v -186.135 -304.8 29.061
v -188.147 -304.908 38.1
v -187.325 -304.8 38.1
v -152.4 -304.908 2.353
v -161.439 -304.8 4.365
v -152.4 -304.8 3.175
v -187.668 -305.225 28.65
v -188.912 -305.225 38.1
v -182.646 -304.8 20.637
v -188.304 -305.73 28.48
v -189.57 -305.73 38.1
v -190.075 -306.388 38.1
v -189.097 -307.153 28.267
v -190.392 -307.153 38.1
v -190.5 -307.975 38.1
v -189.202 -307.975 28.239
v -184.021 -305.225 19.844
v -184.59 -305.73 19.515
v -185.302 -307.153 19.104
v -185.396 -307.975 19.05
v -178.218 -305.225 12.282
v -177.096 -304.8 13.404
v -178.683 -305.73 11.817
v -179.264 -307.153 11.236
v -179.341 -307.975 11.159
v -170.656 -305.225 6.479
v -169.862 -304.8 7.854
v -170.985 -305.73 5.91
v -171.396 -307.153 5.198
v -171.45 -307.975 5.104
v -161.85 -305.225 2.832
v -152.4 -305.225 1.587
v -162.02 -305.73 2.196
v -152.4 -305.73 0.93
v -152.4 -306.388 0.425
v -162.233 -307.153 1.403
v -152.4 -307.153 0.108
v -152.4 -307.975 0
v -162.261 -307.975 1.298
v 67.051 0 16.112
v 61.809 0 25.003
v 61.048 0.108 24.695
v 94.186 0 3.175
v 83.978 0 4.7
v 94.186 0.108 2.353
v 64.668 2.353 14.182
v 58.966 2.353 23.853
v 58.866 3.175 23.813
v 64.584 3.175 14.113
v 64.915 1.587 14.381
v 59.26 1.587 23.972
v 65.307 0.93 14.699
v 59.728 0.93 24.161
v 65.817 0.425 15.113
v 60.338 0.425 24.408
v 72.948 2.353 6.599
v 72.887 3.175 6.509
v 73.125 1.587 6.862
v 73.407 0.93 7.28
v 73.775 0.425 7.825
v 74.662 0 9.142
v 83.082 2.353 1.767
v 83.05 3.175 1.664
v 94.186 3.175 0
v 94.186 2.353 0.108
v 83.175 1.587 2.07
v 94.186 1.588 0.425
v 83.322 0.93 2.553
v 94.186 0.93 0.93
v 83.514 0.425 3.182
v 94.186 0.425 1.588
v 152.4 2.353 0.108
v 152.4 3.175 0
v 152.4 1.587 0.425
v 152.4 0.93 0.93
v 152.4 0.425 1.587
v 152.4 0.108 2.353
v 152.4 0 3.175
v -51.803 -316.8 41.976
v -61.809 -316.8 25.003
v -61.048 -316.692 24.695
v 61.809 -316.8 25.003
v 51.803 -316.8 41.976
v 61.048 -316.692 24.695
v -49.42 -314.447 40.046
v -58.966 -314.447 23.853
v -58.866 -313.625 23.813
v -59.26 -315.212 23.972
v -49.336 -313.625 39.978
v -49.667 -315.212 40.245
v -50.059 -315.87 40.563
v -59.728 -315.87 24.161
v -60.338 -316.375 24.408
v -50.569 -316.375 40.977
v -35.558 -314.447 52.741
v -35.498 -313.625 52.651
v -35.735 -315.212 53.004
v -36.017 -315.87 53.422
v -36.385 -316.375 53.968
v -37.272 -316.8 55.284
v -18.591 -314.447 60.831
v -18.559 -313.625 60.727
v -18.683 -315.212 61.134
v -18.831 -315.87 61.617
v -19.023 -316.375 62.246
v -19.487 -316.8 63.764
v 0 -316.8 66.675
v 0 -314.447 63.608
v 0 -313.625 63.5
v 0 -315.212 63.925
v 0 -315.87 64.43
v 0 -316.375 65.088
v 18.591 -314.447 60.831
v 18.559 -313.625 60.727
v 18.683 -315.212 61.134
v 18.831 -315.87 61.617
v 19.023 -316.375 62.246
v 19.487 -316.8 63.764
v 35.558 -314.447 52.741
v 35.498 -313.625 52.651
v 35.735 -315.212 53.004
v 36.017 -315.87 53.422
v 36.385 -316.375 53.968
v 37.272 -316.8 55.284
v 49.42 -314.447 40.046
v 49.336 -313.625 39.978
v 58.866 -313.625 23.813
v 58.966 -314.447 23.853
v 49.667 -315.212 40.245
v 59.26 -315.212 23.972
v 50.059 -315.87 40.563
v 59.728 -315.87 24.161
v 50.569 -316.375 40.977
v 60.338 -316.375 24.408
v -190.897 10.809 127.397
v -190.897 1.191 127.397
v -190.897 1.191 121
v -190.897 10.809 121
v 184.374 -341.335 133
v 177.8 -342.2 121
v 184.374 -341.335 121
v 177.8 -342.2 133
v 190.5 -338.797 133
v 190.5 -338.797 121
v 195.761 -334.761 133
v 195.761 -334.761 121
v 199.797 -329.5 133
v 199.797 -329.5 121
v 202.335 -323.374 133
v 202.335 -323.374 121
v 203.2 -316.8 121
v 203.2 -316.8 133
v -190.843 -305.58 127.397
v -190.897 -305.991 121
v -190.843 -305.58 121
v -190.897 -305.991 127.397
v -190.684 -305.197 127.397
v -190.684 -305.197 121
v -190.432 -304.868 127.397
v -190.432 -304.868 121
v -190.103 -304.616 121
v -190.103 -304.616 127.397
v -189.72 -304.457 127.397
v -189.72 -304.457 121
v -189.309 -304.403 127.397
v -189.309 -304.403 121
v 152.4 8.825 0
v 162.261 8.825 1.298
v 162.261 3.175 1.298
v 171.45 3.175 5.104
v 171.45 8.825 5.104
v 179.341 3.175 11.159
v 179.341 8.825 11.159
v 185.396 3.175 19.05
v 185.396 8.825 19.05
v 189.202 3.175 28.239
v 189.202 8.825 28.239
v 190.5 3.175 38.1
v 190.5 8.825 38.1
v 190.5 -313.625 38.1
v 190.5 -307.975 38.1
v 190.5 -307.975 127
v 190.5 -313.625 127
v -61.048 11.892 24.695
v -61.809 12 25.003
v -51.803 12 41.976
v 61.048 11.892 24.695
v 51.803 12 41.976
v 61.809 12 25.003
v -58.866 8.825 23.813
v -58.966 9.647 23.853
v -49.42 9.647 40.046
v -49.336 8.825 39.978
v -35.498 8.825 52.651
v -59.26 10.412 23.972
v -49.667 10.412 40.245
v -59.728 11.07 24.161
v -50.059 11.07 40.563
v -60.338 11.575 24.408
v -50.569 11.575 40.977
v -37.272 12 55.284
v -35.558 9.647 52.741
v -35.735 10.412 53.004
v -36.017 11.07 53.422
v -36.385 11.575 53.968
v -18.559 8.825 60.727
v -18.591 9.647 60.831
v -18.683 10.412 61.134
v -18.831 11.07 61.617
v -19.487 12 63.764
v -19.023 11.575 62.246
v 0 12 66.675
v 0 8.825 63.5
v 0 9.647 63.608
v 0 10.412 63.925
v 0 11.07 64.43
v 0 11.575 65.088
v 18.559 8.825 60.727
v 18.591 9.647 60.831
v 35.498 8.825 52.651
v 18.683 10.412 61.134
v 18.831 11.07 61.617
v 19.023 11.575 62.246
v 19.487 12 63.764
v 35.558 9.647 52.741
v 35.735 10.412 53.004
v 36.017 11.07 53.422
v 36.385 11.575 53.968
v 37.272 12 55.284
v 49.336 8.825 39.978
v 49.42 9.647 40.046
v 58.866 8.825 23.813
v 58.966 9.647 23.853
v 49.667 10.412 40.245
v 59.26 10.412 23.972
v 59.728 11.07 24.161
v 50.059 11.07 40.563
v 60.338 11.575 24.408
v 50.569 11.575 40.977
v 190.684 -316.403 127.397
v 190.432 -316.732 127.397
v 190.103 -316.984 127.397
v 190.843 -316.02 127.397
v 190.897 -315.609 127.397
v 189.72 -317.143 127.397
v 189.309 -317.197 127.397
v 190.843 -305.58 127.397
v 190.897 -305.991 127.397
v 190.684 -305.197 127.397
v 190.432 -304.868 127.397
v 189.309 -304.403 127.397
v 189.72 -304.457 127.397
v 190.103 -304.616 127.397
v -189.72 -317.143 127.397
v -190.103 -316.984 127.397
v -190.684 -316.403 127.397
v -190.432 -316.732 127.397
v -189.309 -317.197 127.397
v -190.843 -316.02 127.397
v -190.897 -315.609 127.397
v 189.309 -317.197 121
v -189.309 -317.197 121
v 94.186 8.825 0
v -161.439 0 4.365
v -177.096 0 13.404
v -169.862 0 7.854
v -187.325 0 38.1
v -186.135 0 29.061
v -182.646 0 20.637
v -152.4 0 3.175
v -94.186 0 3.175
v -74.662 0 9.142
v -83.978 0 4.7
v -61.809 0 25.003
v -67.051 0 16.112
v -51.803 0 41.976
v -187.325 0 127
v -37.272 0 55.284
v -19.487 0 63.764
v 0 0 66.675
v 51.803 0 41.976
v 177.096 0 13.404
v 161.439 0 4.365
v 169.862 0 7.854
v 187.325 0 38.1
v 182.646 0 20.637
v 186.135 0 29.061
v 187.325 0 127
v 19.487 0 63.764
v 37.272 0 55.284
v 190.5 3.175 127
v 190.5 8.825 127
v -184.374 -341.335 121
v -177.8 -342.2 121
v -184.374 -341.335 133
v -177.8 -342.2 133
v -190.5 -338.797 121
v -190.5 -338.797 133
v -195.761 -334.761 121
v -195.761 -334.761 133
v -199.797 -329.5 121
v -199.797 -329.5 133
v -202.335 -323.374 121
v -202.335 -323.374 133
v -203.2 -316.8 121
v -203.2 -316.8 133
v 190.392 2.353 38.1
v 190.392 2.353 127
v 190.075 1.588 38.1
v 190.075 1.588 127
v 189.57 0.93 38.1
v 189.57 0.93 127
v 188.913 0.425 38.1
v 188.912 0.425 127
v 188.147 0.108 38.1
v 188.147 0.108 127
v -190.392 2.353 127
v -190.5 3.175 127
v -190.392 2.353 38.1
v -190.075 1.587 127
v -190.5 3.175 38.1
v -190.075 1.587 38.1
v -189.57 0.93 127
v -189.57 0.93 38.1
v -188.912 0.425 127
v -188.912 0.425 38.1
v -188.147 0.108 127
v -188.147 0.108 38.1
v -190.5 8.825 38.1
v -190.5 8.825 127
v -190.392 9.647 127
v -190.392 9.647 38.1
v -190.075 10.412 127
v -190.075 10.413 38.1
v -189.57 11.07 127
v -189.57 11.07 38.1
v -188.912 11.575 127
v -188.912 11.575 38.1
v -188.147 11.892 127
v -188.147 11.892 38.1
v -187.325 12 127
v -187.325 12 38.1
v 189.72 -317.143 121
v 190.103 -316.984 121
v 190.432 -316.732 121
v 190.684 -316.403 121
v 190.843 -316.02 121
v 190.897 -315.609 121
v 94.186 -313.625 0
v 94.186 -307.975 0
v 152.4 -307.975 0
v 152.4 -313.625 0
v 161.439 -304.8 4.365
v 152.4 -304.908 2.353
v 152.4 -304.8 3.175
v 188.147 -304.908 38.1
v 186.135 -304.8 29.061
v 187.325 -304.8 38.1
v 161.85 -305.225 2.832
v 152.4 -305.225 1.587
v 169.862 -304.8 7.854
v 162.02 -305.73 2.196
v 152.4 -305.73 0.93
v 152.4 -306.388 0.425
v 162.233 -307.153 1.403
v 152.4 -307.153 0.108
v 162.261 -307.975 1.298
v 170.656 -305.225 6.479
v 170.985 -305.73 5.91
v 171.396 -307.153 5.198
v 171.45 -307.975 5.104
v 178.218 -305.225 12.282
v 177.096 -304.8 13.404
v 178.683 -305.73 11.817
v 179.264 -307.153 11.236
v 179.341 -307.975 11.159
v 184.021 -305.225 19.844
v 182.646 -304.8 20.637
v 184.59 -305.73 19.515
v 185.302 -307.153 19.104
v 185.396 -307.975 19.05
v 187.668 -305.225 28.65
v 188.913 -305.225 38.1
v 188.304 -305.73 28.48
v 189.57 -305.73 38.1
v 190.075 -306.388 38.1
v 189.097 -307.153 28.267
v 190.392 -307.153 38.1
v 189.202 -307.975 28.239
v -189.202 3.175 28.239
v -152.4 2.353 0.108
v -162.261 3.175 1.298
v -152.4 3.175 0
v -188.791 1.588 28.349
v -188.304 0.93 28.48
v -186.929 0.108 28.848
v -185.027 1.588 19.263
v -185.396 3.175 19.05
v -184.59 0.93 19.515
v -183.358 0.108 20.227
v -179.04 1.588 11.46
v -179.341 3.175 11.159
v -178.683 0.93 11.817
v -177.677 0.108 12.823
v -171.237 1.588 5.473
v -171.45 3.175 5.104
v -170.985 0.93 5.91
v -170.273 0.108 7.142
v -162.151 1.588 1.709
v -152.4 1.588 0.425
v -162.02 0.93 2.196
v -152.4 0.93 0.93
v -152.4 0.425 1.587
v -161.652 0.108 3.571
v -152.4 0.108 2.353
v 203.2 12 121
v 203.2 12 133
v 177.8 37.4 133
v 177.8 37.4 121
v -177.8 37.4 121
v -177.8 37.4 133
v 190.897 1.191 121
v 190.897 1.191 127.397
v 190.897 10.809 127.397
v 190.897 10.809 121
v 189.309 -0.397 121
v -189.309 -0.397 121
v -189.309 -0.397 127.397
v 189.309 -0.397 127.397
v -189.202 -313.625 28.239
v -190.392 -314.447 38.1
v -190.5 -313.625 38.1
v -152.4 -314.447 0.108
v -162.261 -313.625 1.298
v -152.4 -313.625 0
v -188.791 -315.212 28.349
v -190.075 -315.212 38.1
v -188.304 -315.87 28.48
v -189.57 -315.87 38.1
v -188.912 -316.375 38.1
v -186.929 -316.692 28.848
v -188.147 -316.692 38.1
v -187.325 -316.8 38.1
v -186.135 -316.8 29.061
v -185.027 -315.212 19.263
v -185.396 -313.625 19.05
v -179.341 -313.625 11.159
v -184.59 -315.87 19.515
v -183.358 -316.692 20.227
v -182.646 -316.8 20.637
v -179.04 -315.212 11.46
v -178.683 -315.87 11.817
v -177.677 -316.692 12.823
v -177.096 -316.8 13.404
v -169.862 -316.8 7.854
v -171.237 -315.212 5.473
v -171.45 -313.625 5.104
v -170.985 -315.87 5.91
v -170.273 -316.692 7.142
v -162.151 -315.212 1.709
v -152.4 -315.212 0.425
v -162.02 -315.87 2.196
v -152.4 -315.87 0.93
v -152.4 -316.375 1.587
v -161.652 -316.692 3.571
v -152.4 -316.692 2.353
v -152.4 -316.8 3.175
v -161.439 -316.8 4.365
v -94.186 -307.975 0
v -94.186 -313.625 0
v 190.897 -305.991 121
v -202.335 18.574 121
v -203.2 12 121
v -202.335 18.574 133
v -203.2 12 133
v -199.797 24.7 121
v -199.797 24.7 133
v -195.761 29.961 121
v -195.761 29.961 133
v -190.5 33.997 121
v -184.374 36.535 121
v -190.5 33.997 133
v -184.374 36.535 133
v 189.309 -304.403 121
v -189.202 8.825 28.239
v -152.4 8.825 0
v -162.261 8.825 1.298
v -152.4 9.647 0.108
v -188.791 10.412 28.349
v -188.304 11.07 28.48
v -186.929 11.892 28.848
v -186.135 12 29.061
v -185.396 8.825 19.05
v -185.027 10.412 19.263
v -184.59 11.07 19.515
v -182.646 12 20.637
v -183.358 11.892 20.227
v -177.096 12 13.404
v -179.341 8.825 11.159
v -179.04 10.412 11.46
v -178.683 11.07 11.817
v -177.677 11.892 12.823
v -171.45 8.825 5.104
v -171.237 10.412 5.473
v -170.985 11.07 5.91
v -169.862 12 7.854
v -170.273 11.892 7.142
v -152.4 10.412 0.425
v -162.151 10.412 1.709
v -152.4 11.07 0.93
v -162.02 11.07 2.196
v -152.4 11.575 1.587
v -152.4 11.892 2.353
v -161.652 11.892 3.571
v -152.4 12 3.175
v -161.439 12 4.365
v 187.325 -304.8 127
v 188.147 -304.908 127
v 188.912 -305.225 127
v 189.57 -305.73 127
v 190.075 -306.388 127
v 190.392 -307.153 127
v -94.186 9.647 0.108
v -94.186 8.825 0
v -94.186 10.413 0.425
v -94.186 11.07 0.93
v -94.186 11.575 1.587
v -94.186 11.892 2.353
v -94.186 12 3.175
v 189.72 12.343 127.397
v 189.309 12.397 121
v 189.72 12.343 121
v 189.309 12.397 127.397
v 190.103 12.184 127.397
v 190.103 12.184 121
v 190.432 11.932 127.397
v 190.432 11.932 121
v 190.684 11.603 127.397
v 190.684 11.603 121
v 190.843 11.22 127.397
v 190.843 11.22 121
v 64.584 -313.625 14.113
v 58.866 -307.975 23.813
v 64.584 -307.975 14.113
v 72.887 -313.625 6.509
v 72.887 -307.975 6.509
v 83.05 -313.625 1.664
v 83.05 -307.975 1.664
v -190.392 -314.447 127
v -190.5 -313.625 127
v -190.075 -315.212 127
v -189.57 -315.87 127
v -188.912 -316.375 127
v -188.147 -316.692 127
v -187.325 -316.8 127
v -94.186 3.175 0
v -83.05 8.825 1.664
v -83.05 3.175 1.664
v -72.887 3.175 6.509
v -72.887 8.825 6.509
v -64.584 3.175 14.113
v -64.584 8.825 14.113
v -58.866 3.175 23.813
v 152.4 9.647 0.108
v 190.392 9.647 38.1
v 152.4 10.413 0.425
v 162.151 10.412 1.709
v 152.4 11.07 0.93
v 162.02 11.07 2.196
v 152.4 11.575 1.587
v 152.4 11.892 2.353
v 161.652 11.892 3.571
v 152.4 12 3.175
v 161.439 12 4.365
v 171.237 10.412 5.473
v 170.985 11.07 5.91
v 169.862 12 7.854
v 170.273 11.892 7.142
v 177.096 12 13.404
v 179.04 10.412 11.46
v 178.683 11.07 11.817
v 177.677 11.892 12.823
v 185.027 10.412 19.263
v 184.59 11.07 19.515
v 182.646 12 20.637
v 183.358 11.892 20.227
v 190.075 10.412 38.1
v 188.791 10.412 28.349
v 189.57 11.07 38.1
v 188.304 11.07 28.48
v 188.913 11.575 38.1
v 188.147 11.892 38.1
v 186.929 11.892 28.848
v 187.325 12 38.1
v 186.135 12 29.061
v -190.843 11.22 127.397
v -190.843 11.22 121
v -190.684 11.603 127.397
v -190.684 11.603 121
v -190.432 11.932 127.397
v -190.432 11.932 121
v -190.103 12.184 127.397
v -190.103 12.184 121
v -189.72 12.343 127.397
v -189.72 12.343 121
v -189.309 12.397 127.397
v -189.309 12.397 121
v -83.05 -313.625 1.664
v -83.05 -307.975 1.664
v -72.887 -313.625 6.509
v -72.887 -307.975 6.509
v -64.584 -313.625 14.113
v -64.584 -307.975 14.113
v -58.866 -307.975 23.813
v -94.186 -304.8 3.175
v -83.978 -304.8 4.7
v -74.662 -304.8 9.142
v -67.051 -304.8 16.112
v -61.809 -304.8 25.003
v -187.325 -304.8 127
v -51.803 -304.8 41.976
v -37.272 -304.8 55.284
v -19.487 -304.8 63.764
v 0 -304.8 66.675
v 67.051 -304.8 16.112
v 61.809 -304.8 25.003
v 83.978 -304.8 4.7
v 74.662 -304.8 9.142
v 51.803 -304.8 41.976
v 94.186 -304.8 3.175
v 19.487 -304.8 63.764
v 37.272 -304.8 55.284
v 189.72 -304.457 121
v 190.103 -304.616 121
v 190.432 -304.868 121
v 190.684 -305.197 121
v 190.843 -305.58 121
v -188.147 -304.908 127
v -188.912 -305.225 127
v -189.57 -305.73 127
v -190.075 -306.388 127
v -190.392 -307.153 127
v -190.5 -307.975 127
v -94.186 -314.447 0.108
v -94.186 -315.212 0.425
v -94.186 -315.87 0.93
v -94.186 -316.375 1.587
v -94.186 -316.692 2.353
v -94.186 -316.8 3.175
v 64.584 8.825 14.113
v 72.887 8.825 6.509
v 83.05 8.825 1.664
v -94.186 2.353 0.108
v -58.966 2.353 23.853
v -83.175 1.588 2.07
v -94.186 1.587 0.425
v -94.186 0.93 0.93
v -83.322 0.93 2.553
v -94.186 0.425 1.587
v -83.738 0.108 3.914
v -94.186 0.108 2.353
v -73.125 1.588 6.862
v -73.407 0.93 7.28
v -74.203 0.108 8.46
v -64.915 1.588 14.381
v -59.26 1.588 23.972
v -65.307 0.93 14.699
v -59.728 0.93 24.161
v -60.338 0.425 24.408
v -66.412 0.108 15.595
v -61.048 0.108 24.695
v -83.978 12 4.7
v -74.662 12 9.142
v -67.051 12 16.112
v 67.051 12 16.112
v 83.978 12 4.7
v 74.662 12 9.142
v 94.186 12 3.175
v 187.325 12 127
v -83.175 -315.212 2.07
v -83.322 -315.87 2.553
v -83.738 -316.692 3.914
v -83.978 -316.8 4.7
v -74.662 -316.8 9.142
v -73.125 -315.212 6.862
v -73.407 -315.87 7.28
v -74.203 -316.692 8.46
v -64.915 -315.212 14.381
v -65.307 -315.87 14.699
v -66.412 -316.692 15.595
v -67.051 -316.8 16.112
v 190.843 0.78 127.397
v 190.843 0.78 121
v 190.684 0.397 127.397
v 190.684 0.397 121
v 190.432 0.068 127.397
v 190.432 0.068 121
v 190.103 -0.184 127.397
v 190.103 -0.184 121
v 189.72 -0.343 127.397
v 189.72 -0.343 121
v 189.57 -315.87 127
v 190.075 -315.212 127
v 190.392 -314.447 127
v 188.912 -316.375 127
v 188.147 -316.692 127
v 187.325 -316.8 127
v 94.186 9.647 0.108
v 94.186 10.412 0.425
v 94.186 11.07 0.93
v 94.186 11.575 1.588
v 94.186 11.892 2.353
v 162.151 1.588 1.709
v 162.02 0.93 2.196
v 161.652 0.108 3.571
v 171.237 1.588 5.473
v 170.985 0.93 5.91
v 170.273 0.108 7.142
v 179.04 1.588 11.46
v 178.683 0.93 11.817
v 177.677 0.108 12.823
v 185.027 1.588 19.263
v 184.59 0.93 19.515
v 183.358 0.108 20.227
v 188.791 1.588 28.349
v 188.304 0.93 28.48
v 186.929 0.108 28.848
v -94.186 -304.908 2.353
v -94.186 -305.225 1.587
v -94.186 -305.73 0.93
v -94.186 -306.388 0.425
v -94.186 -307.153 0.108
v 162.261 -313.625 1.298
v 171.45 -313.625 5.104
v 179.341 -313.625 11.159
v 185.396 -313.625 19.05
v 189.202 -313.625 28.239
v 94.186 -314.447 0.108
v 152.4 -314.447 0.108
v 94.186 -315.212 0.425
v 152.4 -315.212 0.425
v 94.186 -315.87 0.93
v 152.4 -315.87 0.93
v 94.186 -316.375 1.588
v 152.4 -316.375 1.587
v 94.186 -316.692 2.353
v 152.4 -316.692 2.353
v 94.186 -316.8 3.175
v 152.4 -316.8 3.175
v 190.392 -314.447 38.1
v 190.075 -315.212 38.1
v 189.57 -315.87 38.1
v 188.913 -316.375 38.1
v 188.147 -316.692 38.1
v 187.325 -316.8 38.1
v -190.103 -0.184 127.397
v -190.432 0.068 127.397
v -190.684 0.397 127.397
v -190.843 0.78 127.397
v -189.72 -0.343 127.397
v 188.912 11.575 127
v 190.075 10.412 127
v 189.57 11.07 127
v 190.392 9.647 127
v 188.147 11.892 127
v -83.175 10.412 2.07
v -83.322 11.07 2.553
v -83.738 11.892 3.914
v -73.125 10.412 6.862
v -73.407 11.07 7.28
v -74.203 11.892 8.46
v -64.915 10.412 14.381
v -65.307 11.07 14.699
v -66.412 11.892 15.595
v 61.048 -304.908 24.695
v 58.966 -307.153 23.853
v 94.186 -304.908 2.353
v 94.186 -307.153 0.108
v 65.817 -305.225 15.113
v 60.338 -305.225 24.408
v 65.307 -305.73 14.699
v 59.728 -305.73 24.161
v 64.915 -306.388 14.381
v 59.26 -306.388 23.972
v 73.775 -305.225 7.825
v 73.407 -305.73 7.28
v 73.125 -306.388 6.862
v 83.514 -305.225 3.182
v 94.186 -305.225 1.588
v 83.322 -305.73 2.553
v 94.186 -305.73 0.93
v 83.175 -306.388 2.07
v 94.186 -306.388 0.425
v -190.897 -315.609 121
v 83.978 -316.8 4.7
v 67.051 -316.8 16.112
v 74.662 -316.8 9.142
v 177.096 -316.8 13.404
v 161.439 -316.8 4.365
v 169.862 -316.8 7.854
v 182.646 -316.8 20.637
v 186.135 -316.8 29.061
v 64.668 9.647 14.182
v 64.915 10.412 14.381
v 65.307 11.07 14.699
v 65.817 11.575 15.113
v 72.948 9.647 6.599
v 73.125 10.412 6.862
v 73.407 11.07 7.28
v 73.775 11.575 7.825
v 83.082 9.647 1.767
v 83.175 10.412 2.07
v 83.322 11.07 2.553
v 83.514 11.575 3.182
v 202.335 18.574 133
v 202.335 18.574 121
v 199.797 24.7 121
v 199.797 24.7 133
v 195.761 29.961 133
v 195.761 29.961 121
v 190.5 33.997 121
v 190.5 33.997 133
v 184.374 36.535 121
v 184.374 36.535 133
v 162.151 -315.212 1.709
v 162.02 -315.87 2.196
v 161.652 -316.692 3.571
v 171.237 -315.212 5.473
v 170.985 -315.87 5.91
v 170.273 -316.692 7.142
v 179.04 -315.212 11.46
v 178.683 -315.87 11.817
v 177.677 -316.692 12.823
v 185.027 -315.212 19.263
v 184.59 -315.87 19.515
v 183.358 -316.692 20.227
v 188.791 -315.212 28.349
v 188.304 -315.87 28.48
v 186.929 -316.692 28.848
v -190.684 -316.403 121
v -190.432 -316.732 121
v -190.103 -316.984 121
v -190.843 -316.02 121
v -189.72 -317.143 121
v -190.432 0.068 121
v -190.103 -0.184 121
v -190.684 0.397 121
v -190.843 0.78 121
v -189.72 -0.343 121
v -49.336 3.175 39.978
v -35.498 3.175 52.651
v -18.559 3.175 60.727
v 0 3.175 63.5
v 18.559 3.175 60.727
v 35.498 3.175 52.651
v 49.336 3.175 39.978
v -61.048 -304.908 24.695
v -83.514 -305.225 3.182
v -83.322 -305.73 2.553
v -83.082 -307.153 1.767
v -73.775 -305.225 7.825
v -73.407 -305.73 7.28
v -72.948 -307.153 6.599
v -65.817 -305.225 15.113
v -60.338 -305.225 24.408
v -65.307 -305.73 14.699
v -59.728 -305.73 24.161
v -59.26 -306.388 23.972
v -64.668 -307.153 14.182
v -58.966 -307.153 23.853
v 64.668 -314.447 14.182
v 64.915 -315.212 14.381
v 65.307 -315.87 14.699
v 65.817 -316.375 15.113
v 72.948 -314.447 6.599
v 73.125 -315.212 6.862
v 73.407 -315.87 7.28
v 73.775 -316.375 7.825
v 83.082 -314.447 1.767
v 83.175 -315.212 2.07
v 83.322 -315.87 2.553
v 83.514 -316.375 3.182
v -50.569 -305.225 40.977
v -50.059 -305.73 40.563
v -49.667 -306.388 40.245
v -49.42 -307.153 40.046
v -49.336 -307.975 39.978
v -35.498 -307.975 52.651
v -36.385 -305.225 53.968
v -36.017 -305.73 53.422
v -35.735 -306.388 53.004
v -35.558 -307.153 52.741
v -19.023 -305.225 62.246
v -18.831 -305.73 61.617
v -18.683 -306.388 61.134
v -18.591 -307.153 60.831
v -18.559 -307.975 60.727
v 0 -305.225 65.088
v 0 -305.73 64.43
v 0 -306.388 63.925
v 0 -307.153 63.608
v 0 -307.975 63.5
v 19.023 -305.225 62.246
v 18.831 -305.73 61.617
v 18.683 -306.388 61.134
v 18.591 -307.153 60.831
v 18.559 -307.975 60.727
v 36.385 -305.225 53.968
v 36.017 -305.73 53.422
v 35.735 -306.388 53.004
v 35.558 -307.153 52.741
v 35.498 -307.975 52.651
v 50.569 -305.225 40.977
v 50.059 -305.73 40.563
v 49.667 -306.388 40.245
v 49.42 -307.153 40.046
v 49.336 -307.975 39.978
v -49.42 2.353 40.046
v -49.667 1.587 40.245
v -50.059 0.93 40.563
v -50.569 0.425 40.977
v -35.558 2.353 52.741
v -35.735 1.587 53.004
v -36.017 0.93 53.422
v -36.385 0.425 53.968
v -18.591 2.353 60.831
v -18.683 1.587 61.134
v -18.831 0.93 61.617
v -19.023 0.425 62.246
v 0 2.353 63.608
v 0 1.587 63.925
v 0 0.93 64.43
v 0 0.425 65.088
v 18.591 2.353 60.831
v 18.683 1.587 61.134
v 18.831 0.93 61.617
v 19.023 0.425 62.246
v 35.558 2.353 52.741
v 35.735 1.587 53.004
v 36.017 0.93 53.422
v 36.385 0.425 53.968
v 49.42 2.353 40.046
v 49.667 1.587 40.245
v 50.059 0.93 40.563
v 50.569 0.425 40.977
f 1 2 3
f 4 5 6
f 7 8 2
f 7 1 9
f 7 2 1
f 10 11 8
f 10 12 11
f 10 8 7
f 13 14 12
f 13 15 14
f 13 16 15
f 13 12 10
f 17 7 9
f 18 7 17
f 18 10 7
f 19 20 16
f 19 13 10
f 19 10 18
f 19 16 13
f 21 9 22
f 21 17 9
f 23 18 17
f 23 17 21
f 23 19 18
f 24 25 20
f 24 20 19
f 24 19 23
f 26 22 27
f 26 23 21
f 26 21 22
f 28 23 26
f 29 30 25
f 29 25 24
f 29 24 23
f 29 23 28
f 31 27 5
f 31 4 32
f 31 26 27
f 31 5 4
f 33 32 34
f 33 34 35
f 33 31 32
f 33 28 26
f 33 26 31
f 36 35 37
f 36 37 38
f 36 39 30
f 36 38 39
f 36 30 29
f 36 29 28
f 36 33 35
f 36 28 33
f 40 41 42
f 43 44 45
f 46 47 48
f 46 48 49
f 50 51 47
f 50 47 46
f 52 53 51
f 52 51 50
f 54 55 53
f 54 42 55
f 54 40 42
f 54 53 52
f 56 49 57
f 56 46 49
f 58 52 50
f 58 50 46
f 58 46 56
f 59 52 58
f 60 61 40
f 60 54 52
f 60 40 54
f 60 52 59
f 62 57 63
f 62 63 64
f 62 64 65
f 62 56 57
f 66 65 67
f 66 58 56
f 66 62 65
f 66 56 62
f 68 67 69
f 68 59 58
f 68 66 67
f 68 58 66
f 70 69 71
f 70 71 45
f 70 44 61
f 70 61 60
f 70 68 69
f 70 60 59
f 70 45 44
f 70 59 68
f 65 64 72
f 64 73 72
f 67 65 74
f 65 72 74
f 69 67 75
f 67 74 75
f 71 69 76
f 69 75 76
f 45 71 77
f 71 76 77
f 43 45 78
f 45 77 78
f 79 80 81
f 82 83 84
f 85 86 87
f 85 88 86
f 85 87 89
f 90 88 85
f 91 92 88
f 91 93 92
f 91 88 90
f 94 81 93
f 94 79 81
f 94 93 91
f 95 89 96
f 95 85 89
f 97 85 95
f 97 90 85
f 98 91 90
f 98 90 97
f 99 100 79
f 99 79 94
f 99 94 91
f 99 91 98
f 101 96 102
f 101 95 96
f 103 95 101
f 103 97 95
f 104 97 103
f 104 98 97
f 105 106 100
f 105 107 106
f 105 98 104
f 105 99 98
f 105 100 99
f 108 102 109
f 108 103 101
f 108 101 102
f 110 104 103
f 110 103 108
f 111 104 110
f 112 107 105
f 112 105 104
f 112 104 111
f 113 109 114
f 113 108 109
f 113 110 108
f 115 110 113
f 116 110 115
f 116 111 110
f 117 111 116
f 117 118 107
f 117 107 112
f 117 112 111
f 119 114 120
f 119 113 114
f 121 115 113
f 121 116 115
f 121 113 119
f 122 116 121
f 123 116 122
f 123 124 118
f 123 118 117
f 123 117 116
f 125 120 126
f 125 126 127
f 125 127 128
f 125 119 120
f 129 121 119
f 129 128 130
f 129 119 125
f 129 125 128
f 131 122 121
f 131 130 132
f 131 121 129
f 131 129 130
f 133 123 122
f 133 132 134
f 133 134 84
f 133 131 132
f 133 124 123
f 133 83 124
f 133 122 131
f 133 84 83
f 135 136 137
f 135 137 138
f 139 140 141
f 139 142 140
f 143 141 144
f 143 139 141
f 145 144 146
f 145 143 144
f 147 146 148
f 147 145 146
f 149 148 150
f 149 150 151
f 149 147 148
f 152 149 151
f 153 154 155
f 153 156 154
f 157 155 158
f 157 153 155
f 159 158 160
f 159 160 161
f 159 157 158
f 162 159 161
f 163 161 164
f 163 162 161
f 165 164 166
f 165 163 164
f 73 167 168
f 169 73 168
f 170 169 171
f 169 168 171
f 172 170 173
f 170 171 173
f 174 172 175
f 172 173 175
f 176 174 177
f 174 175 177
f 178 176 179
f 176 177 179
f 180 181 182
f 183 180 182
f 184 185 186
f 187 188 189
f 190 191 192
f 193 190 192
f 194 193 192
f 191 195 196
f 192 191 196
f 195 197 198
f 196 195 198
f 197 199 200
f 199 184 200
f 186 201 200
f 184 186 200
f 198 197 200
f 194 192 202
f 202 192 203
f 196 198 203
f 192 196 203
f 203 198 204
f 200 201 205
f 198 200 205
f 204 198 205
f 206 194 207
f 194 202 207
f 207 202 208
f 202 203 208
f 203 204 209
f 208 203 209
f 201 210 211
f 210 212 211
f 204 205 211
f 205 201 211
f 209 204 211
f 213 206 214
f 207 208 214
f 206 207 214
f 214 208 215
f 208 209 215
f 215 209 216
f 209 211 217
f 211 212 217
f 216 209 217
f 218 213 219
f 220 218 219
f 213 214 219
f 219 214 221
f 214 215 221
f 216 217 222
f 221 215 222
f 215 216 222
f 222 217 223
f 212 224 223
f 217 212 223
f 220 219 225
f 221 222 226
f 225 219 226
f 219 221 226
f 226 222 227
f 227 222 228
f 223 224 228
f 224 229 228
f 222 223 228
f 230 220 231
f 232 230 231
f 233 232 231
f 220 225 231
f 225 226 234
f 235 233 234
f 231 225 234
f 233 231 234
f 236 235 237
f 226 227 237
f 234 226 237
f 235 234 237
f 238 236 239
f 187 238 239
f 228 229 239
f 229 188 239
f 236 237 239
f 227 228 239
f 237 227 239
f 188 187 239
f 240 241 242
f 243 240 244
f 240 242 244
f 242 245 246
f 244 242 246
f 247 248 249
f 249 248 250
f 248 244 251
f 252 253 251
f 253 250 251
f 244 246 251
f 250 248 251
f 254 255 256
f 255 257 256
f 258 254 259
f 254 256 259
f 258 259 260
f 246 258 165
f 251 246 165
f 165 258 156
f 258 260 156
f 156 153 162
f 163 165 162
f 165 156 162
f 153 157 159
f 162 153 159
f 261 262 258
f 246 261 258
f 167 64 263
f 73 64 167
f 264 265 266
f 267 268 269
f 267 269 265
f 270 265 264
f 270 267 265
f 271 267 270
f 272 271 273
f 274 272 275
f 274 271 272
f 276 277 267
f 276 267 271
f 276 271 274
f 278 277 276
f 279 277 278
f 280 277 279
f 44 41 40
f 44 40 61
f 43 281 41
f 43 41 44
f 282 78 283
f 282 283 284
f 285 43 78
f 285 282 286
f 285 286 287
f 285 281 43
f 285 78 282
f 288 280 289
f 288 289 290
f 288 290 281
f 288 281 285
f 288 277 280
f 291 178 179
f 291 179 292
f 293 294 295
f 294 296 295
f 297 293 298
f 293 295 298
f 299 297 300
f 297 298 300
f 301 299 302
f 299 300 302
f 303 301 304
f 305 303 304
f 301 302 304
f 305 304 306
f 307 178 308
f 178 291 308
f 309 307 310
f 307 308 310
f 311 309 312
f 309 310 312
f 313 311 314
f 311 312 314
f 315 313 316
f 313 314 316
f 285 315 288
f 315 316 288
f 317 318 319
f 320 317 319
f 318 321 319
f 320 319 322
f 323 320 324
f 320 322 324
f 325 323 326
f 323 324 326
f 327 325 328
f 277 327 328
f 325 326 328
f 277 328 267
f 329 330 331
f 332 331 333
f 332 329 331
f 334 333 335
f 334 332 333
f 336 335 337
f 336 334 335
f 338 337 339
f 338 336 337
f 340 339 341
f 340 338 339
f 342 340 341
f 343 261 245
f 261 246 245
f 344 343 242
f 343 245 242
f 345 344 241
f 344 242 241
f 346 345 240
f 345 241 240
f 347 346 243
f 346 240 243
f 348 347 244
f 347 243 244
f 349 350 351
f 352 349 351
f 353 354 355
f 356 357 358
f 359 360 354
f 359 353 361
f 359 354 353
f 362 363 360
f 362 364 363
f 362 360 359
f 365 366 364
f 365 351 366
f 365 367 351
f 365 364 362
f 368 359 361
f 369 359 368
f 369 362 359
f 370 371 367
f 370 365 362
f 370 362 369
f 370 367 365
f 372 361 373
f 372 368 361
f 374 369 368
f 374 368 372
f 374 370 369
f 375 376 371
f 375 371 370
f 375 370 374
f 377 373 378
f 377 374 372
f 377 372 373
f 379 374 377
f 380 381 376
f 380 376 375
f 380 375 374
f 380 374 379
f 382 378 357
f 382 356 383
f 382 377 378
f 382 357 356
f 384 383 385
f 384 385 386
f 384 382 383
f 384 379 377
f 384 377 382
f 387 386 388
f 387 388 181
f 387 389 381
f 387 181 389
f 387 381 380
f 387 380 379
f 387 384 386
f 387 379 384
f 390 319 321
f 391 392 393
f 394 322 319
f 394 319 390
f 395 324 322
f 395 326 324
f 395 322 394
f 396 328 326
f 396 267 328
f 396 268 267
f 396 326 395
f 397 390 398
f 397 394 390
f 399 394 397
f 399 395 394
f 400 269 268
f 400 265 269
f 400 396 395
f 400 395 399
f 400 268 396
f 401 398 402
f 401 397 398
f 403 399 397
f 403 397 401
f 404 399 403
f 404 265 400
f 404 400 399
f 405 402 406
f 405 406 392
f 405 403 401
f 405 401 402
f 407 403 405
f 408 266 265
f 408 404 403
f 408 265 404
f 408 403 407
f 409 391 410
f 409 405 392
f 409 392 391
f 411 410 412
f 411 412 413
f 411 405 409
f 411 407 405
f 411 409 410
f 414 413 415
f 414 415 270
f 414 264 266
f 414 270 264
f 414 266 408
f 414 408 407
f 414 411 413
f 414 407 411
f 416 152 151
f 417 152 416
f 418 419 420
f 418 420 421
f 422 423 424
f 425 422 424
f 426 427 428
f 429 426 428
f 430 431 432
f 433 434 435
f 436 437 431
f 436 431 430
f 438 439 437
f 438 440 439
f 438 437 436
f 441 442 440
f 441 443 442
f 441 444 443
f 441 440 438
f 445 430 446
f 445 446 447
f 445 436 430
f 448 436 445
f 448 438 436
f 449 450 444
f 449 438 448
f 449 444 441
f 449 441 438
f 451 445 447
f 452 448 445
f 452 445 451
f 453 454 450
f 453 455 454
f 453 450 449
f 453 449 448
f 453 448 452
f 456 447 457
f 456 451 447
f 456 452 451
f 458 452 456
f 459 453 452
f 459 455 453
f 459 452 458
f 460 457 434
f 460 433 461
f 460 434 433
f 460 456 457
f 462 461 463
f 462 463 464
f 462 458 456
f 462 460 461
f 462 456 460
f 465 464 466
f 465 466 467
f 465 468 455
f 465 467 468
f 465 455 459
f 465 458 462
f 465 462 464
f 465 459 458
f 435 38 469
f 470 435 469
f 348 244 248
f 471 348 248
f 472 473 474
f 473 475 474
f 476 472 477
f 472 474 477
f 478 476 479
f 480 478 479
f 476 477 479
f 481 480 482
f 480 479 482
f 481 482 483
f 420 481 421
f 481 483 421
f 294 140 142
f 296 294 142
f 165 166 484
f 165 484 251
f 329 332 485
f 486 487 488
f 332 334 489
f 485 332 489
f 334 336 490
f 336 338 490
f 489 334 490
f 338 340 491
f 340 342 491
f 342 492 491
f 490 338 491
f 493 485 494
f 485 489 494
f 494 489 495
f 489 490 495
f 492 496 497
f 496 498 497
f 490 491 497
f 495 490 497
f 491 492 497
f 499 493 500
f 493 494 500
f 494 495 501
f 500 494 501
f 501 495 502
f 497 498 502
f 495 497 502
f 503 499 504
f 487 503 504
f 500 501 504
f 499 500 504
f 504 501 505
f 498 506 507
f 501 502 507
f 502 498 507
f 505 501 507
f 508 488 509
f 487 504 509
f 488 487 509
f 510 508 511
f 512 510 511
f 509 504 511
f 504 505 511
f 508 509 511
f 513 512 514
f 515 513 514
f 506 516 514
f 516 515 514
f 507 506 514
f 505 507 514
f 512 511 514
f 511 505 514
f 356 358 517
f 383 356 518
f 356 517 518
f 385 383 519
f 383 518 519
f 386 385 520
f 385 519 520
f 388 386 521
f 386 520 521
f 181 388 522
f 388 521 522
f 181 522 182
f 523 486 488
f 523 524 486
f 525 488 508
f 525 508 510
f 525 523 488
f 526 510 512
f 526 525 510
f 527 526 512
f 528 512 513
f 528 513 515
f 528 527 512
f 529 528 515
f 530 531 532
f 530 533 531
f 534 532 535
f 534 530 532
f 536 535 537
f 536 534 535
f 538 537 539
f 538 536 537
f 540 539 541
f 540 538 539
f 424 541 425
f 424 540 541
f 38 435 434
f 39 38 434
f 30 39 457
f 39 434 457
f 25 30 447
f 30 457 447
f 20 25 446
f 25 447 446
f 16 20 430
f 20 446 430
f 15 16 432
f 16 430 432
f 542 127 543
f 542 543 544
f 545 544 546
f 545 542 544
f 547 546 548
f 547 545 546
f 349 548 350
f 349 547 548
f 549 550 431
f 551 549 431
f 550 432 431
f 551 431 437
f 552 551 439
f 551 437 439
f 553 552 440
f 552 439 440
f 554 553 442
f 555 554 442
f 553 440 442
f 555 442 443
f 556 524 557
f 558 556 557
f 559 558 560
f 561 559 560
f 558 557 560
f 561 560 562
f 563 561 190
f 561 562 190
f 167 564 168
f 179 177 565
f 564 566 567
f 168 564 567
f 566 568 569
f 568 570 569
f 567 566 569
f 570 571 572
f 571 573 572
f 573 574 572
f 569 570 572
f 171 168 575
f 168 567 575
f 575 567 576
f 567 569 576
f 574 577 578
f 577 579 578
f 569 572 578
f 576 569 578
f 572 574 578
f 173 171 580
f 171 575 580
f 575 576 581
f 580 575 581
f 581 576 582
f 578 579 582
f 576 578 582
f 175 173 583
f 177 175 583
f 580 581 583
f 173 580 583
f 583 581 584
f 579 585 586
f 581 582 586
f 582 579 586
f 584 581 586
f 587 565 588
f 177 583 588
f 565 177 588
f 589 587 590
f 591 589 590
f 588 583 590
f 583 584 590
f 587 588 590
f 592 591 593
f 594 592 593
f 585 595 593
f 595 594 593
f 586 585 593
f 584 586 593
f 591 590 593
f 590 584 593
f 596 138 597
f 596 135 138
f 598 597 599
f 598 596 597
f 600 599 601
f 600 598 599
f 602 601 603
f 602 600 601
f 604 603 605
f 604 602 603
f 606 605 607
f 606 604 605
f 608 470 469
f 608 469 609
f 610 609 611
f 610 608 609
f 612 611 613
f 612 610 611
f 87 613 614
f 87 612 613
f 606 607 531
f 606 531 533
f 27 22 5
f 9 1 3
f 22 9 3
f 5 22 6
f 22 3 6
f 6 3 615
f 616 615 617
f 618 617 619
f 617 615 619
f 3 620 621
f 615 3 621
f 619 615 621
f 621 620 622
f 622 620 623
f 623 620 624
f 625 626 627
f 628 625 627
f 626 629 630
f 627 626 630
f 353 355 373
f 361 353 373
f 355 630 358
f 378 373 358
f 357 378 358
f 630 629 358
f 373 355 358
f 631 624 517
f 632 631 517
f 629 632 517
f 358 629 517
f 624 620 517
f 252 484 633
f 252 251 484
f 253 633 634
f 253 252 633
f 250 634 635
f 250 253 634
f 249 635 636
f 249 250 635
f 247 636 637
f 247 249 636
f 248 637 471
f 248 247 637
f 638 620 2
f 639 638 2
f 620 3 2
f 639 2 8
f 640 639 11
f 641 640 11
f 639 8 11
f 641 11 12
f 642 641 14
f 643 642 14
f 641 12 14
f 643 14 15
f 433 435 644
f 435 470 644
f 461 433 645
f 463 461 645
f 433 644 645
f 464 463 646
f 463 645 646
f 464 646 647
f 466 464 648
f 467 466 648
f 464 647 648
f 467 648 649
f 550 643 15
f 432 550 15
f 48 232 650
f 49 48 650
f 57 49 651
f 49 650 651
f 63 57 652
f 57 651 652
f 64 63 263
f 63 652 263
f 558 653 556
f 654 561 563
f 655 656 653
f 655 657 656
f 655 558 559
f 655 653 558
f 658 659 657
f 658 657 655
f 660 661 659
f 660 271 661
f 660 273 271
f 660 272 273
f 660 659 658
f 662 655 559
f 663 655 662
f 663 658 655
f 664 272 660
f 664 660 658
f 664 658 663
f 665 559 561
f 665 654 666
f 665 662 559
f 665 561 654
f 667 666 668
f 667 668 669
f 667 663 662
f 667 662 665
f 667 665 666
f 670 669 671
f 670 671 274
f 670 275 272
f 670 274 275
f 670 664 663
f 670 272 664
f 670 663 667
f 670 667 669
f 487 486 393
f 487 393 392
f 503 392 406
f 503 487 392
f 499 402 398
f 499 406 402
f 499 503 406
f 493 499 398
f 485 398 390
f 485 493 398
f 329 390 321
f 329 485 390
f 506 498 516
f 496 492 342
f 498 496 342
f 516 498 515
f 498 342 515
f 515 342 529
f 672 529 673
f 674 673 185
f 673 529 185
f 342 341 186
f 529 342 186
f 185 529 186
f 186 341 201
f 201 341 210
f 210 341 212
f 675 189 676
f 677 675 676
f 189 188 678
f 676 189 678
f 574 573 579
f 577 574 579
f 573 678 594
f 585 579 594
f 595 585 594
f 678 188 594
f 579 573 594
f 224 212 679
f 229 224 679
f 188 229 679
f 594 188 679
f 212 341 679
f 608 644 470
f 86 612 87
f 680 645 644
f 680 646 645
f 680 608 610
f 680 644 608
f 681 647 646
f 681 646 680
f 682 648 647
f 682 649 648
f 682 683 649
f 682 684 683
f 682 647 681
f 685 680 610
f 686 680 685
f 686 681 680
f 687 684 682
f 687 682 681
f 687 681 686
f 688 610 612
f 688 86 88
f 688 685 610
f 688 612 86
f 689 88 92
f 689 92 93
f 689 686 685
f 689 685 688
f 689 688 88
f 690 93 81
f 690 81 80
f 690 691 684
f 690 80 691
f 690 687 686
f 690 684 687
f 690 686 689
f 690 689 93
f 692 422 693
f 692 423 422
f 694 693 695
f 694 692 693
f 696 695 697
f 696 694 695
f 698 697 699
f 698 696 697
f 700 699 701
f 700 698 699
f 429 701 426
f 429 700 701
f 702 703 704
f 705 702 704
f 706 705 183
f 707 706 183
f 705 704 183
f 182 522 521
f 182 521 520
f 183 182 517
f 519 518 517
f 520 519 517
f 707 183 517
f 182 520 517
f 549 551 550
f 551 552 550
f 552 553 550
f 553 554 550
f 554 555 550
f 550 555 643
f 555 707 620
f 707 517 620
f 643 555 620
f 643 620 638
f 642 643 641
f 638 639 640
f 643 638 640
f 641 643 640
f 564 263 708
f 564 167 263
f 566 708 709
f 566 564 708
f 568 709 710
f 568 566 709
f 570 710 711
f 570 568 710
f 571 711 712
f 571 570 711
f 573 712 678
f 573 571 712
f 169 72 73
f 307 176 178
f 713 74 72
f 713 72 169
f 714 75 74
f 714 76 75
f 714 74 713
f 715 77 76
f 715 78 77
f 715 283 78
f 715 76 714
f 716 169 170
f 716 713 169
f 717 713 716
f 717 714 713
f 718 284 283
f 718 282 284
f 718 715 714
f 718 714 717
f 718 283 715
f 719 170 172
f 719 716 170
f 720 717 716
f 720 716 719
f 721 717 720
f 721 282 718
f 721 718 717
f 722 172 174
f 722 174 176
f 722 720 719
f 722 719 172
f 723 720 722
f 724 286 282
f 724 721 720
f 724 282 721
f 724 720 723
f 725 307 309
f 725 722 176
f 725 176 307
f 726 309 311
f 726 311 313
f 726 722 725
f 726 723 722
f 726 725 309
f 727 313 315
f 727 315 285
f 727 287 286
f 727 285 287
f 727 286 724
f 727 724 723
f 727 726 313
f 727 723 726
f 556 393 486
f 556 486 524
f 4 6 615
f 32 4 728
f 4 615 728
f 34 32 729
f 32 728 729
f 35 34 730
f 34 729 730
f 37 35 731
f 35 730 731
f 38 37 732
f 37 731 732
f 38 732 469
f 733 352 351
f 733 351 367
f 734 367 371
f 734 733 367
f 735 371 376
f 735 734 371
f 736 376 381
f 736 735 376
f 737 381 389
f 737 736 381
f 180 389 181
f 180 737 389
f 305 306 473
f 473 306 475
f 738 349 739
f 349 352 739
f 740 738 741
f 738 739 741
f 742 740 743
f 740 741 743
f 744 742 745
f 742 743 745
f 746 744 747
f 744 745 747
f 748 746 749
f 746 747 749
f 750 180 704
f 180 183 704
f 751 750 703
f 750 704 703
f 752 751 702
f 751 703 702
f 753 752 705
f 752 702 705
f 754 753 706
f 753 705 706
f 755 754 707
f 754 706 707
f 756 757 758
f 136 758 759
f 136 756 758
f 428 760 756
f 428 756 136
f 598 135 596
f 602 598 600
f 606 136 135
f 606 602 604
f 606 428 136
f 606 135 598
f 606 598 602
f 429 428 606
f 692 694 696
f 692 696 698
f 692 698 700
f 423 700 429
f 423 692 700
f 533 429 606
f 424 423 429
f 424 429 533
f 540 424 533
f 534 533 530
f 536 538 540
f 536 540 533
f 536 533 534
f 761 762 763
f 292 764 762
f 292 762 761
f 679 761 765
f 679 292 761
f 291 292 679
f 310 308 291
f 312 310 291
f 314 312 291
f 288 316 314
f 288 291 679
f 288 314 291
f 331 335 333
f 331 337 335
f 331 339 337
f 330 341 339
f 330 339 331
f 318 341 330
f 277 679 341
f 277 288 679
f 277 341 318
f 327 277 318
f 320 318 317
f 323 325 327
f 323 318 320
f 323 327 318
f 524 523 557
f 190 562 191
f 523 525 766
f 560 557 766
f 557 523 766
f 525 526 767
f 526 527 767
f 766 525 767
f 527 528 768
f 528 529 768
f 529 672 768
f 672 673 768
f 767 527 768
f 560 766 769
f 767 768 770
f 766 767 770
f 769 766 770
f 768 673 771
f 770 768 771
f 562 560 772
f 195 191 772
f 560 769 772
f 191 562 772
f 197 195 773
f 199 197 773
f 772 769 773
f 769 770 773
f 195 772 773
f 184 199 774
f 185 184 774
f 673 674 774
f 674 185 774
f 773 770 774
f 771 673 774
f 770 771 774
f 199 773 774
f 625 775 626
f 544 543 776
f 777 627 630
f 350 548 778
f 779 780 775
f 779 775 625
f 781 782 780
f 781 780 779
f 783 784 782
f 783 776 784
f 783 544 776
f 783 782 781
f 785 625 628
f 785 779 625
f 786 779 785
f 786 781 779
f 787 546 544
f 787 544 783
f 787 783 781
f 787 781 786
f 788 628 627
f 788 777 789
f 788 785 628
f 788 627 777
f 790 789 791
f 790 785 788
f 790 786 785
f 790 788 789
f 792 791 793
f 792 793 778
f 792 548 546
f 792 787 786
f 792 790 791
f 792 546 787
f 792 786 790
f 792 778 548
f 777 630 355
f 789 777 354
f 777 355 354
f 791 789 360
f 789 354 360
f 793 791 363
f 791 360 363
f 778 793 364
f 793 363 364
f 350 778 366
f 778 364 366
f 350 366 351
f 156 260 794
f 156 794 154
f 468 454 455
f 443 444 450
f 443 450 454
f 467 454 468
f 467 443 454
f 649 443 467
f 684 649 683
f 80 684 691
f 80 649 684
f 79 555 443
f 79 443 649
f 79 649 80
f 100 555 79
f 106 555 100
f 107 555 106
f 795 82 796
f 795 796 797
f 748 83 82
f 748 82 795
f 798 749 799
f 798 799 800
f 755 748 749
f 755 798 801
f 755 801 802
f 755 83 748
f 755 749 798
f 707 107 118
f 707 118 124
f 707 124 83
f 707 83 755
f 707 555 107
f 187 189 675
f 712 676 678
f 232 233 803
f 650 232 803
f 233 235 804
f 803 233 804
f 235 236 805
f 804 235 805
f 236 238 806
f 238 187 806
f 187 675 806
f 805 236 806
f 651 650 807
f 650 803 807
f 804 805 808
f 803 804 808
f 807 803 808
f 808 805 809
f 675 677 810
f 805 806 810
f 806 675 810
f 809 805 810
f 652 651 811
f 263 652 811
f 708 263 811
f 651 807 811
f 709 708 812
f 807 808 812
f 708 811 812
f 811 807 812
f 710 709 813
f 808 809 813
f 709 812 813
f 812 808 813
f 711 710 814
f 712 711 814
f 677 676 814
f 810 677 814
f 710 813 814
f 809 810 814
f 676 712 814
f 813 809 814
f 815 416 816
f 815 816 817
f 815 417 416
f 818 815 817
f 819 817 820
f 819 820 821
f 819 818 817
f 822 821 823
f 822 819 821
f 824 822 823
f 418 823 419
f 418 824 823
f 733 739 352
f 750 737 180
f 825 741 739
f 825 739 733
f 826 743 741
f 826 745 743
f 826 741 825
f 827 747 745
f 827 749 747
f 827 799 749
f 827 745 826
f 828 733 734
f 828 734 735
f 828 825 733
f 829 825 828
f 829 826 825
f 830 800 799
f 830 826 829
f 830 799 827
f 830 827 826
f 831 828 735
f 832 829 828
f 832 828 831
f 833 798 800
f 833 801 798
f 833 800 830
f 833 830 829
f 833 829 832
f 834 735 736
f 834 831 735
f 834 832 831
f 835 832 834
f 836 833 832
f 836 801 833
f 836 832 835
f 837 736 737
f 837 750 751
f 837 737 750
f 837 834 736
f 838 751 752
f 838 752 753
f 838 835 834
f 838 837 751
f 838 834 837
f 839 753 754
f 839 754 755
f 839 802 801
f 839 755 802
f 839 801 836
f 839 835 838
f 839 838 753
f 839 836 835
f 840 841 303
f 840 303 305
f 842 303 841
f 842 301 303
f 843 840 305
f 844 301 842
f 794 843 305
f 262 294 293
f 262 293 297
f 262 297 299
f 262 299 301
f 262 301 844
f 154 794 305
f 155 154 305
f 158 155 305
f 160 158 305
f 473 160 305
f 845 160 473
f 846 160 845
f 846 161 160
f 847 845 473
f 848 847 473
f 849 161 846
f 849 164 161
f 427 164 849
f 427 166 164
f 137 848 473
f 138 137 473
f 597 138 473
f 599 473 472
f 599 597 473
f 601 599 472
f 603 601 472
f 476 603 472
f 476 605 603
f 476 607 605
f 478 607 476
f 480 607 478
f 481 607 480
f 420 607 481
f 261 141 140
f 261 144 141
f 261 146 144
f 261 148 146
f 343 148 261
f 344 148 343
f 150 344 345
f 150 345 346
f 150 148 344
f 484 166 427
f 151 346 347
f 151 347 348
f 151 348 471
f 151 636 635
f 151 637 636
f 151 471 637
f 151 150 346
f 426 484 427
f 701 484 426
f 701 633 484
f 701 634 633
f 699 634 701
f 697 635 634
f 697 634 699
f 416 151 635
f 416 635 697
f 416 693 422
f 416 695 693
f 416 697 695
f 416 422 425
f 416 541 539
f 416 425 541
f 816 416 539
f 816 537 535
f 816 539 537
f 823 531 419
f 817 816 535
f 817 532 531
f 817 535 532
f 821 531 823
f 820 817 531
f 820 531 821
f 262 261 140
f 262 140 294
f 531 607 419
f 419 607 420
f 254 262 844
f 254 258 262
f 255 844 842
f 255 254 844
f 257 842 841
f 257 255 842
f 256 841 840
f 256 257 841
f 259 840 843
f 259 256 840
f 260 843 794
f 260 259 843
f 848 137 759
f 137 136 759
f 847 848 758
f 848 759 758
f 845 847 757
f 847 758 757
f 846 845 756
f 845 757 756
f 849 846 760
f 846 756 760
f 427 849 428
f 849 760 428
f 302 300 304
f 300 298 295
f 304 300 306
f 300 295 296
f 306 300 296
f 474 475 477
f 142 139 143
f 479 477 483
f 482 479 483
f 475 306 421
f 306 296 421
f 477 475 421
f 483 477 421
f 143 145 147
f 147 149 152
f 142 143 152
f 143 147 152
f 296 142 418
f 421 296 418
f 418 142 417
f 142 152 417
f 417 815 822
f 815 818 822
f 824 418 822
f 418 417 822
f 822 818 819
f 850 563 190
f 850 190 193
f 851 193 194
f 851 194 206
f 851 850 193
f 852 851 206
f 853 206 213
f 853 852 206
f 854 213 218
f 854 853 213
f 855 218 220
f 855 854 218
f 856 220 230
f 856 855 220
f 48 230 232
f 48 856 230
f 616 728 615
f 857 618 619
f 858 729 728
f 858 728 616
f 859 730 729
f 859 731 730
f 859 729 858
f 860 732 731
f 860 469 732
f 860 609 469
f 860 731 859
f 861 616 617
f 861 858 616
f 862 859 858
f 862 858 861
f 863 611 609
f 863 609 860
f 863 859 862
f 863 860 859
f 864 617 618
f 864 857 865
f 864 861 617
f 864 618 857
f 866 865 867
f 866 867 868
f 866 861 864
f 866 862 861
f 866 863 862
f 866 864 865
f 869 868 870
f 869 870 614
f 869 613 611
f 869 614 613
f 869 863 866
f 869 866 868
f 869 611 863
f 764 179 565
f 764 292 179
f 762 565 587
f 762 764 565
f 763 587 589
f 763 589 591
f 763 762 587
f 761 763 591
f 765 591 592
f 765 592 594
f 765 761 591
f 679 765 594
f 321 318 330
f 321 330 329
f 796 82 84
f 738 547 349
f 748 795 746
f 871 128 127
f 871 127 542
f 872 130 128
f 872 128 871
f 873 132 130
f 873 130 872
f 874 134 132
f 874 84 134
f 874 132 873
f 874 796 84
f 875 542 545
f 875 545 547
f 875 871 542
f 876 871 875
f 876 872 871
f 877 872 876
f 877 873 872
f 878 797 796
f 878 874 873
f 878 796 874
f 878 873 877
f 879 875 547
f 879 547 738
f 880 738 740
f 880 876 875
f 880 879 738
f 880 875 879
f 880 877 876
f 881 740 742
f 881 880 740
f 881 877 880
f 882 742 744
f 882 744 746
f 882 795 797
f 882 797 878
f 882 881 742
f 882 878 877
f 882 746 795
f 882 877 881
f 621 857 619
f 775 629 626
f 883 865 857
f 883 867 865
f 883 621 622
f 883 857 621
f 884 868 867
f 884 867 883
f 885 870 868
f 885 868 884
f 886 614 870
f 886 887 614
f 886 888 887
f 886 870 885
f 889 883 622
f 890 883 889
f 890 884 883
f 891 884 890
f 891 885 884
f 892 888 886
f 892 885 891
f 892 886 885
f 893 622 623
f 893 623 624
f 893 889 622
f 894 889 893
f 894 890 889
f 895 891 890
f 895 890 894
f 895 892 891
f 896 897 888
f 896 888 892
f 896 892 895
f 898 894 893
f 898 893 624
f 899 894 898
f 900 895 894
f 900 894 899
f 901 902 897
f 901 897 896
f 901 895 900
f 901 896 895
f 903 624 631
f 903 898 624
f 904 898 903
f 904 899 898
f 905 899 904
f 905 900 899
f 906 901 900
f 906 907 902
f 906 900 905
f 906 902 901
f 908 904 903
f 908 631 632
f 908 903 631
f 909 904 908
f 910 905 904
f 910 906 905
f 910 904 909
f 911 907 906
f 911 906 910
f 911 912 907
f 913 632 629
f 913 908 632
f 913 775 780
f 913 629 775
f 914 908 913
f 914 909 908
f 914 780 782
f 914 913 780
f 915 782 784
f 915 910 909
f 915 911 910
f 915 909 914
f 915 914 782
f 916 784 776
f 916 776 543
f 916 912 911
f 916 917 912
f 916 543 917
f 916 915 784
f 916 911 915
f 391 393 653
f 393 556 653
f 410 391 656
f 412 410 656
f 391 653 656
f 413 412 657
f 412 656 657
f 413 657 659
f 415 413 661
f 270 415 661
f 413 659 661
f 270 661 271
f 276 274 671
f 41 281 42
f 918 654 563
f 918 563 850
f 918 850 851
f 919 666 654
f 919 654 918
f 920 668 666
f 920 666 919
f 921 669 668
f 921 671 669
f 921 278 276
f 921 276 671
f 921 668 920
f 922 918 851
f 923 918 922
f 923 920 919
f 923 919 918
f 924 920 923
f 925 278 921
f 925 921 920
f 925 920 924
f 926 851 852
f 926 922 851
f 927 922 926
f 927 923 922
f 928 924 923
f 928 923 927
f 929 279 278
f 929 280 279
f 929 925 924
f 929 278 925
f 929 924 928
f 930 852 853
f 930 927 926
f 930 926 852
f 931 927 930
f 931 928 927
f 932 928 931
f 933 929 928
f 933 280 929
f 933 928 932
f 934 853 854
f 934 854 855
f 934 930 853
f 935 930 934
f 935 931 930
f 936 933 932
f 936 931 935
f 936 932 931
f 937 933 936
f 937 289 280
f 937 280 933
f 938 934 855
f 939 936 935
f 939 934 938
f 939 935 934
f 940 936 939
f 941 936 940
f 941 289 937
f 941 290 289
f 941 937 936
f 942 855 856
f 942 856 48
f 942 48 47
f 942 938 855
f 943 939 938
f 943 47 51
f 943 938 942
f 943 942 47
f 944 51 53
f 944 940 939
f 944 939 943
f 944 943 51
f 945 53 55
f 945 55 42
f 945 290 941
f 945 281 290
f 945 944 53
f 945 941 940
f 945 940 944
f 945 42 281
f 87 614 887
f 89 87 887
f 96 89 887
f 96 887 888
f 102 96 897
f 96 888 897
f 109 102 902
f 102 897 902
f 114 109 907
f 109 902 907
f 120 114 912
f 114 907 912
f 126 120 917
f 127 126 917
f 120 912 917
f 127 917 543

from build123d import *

# Parameters (mm, degrees)
F1_DEPTH  = 12
F2_R      = 38.1
F5_DEPTH  = 12
F6_R      = 38.1
F7_W      = 379.6
F7_H      = 12
F8_DEPTH  = 203.2
F9_W      = 12.79375
F9_H      = 89.69375
F10_DEPTH = 190.896875
F11_R     = 1.5875
F12_R     = 3.175
F12_2_R   = 3.175
F13_R     = 25.4


with BuildPart() as f1:
    # F0 (on Front) → F1 (new body)
    with BuildSketch(Plane.XZ):
        with BuildLine():
            Line((-190.5, 0), (-63.5, 0))
            ThreePointArc((-63.5, 0), (0, 63.5), (63.5, 0))
            Line((63.5, 0), (190.5, 0))
            Line((190.5, 0), (190.5, 127))
            Line((190.5, 127), (-190.5, 127))
            Line((-190.5, 127), (-190.5, 0))
        make_face()
    extrude(amount=-F1_DEPTH)

    # F2
    f2_edges = [f1.edges().sort_by_distance(p)[0] for p in [
        (-190.5, 6, 0),
        (-63.5, 6, 0),
        (63.5, 6, 0),
        (190.5, 6, 0),
    ]]
    fillet(f2_edges, radius=F2_R)

    # F12
    f12_edges = [f1.edges().sort_by_distance(p)[0] for p in [
        (-123.29286, 0, 0),
        (-123.29286, 12, 0),
    ]]
    fillet(f12_edges, radius=F12_R)


with BuildPart() as f5:
    # F4 (on offset) → F5 (new body)
    with BuildSketch(Plane.XZ.offset(304.8)):
        with BuildLine():
            Line((-190.5, 0), (-63.5, 0))
            ThreePointArc((-63.5, 0), (0, 63.5), (63.5, 0))
            Line((63.5, 0), (190.5, 0))
            Line((190.5, 0), (190.5, 127))
            Line((190.5, 127), (-190.5, 127))
            Line((-190.5, 127), (-190.5, 0))
        make_face()
    extrude(amount=F5_DEPTH)

    # F6
    f6_edges = [f5.edges().sort_by_distance(p)[0] for p in [
        (190.5, -310.8, 0),
        (-63.5, -310.8, 0),
        (-190.5, -310.8, 0),
        (63.5, -310.8, 0),
    ]]
    fillet(f6_edges, radius=F6_R)

    # F12#2
    f12_2_edges = [f5.edges().sort_by_distance(p)[0] for p in [
        (-72.887173, -316.8, 6.509149),
        (-72.887173, -304.8, 6.509149),
    ]]
    fillet(f12_2_edges, radius=F12_2_R)


with BuildPart() as f8:
    # F7 (on Right) → F8 (new body, symmetric)
    with BuildSketch(Plane.YZ):
        with Locations((-152.4, 127)):
            Rectangle(F7_W, F7_H)
    extrude(amount=F8_DEPTH, both=True)

    # F9 (on Right) → F10 (cut, symmetric)
    with BuildSketch(Plane.YZ):
        with Locations((-310.8, 82.55)):
            Rectangle(F9_W, F9_H)
        with Locations((6, 82.55)):
            Rectangle(F9_W, F9_H)
    extrude(amount=F10_DEPTH, both=True, mode=Mode.SUBTRACT)

    # F11
    f11_edges = [f8.edges().sort_by_distance(p)[0] for p in [
        (-190.896875, -317.196875, 124.198437),
        (-190.896875, -304.403125, 124.198437),
        (190.896875, -317.196875, 124.198437),
        (190.896875, -304.403125, 124.198437),
        (190.896875, -0.396875, 124.198437),
        (190.896875, 12.396875, 124.198437),
        (-190.896875, -0.396875, 124.198437),
        (-190.896875, 12.396875, 124.198437),
    ]]
    fillet(f11_edges, radius=F11_R)

    # F13
    f13_edges = [f8.edges().sort_by_distance(p)[0] for p in [
        (203.2, -342.2, 127),
        (-203.2, -342.2, 127),
        (203.2, 37.4, 127),
        (-203.2, 37.4, 127),
    ]]
    fillet(f13_edges, radius=F13_R)


solid = Compound([f1.part, f5.part, f8.part])
